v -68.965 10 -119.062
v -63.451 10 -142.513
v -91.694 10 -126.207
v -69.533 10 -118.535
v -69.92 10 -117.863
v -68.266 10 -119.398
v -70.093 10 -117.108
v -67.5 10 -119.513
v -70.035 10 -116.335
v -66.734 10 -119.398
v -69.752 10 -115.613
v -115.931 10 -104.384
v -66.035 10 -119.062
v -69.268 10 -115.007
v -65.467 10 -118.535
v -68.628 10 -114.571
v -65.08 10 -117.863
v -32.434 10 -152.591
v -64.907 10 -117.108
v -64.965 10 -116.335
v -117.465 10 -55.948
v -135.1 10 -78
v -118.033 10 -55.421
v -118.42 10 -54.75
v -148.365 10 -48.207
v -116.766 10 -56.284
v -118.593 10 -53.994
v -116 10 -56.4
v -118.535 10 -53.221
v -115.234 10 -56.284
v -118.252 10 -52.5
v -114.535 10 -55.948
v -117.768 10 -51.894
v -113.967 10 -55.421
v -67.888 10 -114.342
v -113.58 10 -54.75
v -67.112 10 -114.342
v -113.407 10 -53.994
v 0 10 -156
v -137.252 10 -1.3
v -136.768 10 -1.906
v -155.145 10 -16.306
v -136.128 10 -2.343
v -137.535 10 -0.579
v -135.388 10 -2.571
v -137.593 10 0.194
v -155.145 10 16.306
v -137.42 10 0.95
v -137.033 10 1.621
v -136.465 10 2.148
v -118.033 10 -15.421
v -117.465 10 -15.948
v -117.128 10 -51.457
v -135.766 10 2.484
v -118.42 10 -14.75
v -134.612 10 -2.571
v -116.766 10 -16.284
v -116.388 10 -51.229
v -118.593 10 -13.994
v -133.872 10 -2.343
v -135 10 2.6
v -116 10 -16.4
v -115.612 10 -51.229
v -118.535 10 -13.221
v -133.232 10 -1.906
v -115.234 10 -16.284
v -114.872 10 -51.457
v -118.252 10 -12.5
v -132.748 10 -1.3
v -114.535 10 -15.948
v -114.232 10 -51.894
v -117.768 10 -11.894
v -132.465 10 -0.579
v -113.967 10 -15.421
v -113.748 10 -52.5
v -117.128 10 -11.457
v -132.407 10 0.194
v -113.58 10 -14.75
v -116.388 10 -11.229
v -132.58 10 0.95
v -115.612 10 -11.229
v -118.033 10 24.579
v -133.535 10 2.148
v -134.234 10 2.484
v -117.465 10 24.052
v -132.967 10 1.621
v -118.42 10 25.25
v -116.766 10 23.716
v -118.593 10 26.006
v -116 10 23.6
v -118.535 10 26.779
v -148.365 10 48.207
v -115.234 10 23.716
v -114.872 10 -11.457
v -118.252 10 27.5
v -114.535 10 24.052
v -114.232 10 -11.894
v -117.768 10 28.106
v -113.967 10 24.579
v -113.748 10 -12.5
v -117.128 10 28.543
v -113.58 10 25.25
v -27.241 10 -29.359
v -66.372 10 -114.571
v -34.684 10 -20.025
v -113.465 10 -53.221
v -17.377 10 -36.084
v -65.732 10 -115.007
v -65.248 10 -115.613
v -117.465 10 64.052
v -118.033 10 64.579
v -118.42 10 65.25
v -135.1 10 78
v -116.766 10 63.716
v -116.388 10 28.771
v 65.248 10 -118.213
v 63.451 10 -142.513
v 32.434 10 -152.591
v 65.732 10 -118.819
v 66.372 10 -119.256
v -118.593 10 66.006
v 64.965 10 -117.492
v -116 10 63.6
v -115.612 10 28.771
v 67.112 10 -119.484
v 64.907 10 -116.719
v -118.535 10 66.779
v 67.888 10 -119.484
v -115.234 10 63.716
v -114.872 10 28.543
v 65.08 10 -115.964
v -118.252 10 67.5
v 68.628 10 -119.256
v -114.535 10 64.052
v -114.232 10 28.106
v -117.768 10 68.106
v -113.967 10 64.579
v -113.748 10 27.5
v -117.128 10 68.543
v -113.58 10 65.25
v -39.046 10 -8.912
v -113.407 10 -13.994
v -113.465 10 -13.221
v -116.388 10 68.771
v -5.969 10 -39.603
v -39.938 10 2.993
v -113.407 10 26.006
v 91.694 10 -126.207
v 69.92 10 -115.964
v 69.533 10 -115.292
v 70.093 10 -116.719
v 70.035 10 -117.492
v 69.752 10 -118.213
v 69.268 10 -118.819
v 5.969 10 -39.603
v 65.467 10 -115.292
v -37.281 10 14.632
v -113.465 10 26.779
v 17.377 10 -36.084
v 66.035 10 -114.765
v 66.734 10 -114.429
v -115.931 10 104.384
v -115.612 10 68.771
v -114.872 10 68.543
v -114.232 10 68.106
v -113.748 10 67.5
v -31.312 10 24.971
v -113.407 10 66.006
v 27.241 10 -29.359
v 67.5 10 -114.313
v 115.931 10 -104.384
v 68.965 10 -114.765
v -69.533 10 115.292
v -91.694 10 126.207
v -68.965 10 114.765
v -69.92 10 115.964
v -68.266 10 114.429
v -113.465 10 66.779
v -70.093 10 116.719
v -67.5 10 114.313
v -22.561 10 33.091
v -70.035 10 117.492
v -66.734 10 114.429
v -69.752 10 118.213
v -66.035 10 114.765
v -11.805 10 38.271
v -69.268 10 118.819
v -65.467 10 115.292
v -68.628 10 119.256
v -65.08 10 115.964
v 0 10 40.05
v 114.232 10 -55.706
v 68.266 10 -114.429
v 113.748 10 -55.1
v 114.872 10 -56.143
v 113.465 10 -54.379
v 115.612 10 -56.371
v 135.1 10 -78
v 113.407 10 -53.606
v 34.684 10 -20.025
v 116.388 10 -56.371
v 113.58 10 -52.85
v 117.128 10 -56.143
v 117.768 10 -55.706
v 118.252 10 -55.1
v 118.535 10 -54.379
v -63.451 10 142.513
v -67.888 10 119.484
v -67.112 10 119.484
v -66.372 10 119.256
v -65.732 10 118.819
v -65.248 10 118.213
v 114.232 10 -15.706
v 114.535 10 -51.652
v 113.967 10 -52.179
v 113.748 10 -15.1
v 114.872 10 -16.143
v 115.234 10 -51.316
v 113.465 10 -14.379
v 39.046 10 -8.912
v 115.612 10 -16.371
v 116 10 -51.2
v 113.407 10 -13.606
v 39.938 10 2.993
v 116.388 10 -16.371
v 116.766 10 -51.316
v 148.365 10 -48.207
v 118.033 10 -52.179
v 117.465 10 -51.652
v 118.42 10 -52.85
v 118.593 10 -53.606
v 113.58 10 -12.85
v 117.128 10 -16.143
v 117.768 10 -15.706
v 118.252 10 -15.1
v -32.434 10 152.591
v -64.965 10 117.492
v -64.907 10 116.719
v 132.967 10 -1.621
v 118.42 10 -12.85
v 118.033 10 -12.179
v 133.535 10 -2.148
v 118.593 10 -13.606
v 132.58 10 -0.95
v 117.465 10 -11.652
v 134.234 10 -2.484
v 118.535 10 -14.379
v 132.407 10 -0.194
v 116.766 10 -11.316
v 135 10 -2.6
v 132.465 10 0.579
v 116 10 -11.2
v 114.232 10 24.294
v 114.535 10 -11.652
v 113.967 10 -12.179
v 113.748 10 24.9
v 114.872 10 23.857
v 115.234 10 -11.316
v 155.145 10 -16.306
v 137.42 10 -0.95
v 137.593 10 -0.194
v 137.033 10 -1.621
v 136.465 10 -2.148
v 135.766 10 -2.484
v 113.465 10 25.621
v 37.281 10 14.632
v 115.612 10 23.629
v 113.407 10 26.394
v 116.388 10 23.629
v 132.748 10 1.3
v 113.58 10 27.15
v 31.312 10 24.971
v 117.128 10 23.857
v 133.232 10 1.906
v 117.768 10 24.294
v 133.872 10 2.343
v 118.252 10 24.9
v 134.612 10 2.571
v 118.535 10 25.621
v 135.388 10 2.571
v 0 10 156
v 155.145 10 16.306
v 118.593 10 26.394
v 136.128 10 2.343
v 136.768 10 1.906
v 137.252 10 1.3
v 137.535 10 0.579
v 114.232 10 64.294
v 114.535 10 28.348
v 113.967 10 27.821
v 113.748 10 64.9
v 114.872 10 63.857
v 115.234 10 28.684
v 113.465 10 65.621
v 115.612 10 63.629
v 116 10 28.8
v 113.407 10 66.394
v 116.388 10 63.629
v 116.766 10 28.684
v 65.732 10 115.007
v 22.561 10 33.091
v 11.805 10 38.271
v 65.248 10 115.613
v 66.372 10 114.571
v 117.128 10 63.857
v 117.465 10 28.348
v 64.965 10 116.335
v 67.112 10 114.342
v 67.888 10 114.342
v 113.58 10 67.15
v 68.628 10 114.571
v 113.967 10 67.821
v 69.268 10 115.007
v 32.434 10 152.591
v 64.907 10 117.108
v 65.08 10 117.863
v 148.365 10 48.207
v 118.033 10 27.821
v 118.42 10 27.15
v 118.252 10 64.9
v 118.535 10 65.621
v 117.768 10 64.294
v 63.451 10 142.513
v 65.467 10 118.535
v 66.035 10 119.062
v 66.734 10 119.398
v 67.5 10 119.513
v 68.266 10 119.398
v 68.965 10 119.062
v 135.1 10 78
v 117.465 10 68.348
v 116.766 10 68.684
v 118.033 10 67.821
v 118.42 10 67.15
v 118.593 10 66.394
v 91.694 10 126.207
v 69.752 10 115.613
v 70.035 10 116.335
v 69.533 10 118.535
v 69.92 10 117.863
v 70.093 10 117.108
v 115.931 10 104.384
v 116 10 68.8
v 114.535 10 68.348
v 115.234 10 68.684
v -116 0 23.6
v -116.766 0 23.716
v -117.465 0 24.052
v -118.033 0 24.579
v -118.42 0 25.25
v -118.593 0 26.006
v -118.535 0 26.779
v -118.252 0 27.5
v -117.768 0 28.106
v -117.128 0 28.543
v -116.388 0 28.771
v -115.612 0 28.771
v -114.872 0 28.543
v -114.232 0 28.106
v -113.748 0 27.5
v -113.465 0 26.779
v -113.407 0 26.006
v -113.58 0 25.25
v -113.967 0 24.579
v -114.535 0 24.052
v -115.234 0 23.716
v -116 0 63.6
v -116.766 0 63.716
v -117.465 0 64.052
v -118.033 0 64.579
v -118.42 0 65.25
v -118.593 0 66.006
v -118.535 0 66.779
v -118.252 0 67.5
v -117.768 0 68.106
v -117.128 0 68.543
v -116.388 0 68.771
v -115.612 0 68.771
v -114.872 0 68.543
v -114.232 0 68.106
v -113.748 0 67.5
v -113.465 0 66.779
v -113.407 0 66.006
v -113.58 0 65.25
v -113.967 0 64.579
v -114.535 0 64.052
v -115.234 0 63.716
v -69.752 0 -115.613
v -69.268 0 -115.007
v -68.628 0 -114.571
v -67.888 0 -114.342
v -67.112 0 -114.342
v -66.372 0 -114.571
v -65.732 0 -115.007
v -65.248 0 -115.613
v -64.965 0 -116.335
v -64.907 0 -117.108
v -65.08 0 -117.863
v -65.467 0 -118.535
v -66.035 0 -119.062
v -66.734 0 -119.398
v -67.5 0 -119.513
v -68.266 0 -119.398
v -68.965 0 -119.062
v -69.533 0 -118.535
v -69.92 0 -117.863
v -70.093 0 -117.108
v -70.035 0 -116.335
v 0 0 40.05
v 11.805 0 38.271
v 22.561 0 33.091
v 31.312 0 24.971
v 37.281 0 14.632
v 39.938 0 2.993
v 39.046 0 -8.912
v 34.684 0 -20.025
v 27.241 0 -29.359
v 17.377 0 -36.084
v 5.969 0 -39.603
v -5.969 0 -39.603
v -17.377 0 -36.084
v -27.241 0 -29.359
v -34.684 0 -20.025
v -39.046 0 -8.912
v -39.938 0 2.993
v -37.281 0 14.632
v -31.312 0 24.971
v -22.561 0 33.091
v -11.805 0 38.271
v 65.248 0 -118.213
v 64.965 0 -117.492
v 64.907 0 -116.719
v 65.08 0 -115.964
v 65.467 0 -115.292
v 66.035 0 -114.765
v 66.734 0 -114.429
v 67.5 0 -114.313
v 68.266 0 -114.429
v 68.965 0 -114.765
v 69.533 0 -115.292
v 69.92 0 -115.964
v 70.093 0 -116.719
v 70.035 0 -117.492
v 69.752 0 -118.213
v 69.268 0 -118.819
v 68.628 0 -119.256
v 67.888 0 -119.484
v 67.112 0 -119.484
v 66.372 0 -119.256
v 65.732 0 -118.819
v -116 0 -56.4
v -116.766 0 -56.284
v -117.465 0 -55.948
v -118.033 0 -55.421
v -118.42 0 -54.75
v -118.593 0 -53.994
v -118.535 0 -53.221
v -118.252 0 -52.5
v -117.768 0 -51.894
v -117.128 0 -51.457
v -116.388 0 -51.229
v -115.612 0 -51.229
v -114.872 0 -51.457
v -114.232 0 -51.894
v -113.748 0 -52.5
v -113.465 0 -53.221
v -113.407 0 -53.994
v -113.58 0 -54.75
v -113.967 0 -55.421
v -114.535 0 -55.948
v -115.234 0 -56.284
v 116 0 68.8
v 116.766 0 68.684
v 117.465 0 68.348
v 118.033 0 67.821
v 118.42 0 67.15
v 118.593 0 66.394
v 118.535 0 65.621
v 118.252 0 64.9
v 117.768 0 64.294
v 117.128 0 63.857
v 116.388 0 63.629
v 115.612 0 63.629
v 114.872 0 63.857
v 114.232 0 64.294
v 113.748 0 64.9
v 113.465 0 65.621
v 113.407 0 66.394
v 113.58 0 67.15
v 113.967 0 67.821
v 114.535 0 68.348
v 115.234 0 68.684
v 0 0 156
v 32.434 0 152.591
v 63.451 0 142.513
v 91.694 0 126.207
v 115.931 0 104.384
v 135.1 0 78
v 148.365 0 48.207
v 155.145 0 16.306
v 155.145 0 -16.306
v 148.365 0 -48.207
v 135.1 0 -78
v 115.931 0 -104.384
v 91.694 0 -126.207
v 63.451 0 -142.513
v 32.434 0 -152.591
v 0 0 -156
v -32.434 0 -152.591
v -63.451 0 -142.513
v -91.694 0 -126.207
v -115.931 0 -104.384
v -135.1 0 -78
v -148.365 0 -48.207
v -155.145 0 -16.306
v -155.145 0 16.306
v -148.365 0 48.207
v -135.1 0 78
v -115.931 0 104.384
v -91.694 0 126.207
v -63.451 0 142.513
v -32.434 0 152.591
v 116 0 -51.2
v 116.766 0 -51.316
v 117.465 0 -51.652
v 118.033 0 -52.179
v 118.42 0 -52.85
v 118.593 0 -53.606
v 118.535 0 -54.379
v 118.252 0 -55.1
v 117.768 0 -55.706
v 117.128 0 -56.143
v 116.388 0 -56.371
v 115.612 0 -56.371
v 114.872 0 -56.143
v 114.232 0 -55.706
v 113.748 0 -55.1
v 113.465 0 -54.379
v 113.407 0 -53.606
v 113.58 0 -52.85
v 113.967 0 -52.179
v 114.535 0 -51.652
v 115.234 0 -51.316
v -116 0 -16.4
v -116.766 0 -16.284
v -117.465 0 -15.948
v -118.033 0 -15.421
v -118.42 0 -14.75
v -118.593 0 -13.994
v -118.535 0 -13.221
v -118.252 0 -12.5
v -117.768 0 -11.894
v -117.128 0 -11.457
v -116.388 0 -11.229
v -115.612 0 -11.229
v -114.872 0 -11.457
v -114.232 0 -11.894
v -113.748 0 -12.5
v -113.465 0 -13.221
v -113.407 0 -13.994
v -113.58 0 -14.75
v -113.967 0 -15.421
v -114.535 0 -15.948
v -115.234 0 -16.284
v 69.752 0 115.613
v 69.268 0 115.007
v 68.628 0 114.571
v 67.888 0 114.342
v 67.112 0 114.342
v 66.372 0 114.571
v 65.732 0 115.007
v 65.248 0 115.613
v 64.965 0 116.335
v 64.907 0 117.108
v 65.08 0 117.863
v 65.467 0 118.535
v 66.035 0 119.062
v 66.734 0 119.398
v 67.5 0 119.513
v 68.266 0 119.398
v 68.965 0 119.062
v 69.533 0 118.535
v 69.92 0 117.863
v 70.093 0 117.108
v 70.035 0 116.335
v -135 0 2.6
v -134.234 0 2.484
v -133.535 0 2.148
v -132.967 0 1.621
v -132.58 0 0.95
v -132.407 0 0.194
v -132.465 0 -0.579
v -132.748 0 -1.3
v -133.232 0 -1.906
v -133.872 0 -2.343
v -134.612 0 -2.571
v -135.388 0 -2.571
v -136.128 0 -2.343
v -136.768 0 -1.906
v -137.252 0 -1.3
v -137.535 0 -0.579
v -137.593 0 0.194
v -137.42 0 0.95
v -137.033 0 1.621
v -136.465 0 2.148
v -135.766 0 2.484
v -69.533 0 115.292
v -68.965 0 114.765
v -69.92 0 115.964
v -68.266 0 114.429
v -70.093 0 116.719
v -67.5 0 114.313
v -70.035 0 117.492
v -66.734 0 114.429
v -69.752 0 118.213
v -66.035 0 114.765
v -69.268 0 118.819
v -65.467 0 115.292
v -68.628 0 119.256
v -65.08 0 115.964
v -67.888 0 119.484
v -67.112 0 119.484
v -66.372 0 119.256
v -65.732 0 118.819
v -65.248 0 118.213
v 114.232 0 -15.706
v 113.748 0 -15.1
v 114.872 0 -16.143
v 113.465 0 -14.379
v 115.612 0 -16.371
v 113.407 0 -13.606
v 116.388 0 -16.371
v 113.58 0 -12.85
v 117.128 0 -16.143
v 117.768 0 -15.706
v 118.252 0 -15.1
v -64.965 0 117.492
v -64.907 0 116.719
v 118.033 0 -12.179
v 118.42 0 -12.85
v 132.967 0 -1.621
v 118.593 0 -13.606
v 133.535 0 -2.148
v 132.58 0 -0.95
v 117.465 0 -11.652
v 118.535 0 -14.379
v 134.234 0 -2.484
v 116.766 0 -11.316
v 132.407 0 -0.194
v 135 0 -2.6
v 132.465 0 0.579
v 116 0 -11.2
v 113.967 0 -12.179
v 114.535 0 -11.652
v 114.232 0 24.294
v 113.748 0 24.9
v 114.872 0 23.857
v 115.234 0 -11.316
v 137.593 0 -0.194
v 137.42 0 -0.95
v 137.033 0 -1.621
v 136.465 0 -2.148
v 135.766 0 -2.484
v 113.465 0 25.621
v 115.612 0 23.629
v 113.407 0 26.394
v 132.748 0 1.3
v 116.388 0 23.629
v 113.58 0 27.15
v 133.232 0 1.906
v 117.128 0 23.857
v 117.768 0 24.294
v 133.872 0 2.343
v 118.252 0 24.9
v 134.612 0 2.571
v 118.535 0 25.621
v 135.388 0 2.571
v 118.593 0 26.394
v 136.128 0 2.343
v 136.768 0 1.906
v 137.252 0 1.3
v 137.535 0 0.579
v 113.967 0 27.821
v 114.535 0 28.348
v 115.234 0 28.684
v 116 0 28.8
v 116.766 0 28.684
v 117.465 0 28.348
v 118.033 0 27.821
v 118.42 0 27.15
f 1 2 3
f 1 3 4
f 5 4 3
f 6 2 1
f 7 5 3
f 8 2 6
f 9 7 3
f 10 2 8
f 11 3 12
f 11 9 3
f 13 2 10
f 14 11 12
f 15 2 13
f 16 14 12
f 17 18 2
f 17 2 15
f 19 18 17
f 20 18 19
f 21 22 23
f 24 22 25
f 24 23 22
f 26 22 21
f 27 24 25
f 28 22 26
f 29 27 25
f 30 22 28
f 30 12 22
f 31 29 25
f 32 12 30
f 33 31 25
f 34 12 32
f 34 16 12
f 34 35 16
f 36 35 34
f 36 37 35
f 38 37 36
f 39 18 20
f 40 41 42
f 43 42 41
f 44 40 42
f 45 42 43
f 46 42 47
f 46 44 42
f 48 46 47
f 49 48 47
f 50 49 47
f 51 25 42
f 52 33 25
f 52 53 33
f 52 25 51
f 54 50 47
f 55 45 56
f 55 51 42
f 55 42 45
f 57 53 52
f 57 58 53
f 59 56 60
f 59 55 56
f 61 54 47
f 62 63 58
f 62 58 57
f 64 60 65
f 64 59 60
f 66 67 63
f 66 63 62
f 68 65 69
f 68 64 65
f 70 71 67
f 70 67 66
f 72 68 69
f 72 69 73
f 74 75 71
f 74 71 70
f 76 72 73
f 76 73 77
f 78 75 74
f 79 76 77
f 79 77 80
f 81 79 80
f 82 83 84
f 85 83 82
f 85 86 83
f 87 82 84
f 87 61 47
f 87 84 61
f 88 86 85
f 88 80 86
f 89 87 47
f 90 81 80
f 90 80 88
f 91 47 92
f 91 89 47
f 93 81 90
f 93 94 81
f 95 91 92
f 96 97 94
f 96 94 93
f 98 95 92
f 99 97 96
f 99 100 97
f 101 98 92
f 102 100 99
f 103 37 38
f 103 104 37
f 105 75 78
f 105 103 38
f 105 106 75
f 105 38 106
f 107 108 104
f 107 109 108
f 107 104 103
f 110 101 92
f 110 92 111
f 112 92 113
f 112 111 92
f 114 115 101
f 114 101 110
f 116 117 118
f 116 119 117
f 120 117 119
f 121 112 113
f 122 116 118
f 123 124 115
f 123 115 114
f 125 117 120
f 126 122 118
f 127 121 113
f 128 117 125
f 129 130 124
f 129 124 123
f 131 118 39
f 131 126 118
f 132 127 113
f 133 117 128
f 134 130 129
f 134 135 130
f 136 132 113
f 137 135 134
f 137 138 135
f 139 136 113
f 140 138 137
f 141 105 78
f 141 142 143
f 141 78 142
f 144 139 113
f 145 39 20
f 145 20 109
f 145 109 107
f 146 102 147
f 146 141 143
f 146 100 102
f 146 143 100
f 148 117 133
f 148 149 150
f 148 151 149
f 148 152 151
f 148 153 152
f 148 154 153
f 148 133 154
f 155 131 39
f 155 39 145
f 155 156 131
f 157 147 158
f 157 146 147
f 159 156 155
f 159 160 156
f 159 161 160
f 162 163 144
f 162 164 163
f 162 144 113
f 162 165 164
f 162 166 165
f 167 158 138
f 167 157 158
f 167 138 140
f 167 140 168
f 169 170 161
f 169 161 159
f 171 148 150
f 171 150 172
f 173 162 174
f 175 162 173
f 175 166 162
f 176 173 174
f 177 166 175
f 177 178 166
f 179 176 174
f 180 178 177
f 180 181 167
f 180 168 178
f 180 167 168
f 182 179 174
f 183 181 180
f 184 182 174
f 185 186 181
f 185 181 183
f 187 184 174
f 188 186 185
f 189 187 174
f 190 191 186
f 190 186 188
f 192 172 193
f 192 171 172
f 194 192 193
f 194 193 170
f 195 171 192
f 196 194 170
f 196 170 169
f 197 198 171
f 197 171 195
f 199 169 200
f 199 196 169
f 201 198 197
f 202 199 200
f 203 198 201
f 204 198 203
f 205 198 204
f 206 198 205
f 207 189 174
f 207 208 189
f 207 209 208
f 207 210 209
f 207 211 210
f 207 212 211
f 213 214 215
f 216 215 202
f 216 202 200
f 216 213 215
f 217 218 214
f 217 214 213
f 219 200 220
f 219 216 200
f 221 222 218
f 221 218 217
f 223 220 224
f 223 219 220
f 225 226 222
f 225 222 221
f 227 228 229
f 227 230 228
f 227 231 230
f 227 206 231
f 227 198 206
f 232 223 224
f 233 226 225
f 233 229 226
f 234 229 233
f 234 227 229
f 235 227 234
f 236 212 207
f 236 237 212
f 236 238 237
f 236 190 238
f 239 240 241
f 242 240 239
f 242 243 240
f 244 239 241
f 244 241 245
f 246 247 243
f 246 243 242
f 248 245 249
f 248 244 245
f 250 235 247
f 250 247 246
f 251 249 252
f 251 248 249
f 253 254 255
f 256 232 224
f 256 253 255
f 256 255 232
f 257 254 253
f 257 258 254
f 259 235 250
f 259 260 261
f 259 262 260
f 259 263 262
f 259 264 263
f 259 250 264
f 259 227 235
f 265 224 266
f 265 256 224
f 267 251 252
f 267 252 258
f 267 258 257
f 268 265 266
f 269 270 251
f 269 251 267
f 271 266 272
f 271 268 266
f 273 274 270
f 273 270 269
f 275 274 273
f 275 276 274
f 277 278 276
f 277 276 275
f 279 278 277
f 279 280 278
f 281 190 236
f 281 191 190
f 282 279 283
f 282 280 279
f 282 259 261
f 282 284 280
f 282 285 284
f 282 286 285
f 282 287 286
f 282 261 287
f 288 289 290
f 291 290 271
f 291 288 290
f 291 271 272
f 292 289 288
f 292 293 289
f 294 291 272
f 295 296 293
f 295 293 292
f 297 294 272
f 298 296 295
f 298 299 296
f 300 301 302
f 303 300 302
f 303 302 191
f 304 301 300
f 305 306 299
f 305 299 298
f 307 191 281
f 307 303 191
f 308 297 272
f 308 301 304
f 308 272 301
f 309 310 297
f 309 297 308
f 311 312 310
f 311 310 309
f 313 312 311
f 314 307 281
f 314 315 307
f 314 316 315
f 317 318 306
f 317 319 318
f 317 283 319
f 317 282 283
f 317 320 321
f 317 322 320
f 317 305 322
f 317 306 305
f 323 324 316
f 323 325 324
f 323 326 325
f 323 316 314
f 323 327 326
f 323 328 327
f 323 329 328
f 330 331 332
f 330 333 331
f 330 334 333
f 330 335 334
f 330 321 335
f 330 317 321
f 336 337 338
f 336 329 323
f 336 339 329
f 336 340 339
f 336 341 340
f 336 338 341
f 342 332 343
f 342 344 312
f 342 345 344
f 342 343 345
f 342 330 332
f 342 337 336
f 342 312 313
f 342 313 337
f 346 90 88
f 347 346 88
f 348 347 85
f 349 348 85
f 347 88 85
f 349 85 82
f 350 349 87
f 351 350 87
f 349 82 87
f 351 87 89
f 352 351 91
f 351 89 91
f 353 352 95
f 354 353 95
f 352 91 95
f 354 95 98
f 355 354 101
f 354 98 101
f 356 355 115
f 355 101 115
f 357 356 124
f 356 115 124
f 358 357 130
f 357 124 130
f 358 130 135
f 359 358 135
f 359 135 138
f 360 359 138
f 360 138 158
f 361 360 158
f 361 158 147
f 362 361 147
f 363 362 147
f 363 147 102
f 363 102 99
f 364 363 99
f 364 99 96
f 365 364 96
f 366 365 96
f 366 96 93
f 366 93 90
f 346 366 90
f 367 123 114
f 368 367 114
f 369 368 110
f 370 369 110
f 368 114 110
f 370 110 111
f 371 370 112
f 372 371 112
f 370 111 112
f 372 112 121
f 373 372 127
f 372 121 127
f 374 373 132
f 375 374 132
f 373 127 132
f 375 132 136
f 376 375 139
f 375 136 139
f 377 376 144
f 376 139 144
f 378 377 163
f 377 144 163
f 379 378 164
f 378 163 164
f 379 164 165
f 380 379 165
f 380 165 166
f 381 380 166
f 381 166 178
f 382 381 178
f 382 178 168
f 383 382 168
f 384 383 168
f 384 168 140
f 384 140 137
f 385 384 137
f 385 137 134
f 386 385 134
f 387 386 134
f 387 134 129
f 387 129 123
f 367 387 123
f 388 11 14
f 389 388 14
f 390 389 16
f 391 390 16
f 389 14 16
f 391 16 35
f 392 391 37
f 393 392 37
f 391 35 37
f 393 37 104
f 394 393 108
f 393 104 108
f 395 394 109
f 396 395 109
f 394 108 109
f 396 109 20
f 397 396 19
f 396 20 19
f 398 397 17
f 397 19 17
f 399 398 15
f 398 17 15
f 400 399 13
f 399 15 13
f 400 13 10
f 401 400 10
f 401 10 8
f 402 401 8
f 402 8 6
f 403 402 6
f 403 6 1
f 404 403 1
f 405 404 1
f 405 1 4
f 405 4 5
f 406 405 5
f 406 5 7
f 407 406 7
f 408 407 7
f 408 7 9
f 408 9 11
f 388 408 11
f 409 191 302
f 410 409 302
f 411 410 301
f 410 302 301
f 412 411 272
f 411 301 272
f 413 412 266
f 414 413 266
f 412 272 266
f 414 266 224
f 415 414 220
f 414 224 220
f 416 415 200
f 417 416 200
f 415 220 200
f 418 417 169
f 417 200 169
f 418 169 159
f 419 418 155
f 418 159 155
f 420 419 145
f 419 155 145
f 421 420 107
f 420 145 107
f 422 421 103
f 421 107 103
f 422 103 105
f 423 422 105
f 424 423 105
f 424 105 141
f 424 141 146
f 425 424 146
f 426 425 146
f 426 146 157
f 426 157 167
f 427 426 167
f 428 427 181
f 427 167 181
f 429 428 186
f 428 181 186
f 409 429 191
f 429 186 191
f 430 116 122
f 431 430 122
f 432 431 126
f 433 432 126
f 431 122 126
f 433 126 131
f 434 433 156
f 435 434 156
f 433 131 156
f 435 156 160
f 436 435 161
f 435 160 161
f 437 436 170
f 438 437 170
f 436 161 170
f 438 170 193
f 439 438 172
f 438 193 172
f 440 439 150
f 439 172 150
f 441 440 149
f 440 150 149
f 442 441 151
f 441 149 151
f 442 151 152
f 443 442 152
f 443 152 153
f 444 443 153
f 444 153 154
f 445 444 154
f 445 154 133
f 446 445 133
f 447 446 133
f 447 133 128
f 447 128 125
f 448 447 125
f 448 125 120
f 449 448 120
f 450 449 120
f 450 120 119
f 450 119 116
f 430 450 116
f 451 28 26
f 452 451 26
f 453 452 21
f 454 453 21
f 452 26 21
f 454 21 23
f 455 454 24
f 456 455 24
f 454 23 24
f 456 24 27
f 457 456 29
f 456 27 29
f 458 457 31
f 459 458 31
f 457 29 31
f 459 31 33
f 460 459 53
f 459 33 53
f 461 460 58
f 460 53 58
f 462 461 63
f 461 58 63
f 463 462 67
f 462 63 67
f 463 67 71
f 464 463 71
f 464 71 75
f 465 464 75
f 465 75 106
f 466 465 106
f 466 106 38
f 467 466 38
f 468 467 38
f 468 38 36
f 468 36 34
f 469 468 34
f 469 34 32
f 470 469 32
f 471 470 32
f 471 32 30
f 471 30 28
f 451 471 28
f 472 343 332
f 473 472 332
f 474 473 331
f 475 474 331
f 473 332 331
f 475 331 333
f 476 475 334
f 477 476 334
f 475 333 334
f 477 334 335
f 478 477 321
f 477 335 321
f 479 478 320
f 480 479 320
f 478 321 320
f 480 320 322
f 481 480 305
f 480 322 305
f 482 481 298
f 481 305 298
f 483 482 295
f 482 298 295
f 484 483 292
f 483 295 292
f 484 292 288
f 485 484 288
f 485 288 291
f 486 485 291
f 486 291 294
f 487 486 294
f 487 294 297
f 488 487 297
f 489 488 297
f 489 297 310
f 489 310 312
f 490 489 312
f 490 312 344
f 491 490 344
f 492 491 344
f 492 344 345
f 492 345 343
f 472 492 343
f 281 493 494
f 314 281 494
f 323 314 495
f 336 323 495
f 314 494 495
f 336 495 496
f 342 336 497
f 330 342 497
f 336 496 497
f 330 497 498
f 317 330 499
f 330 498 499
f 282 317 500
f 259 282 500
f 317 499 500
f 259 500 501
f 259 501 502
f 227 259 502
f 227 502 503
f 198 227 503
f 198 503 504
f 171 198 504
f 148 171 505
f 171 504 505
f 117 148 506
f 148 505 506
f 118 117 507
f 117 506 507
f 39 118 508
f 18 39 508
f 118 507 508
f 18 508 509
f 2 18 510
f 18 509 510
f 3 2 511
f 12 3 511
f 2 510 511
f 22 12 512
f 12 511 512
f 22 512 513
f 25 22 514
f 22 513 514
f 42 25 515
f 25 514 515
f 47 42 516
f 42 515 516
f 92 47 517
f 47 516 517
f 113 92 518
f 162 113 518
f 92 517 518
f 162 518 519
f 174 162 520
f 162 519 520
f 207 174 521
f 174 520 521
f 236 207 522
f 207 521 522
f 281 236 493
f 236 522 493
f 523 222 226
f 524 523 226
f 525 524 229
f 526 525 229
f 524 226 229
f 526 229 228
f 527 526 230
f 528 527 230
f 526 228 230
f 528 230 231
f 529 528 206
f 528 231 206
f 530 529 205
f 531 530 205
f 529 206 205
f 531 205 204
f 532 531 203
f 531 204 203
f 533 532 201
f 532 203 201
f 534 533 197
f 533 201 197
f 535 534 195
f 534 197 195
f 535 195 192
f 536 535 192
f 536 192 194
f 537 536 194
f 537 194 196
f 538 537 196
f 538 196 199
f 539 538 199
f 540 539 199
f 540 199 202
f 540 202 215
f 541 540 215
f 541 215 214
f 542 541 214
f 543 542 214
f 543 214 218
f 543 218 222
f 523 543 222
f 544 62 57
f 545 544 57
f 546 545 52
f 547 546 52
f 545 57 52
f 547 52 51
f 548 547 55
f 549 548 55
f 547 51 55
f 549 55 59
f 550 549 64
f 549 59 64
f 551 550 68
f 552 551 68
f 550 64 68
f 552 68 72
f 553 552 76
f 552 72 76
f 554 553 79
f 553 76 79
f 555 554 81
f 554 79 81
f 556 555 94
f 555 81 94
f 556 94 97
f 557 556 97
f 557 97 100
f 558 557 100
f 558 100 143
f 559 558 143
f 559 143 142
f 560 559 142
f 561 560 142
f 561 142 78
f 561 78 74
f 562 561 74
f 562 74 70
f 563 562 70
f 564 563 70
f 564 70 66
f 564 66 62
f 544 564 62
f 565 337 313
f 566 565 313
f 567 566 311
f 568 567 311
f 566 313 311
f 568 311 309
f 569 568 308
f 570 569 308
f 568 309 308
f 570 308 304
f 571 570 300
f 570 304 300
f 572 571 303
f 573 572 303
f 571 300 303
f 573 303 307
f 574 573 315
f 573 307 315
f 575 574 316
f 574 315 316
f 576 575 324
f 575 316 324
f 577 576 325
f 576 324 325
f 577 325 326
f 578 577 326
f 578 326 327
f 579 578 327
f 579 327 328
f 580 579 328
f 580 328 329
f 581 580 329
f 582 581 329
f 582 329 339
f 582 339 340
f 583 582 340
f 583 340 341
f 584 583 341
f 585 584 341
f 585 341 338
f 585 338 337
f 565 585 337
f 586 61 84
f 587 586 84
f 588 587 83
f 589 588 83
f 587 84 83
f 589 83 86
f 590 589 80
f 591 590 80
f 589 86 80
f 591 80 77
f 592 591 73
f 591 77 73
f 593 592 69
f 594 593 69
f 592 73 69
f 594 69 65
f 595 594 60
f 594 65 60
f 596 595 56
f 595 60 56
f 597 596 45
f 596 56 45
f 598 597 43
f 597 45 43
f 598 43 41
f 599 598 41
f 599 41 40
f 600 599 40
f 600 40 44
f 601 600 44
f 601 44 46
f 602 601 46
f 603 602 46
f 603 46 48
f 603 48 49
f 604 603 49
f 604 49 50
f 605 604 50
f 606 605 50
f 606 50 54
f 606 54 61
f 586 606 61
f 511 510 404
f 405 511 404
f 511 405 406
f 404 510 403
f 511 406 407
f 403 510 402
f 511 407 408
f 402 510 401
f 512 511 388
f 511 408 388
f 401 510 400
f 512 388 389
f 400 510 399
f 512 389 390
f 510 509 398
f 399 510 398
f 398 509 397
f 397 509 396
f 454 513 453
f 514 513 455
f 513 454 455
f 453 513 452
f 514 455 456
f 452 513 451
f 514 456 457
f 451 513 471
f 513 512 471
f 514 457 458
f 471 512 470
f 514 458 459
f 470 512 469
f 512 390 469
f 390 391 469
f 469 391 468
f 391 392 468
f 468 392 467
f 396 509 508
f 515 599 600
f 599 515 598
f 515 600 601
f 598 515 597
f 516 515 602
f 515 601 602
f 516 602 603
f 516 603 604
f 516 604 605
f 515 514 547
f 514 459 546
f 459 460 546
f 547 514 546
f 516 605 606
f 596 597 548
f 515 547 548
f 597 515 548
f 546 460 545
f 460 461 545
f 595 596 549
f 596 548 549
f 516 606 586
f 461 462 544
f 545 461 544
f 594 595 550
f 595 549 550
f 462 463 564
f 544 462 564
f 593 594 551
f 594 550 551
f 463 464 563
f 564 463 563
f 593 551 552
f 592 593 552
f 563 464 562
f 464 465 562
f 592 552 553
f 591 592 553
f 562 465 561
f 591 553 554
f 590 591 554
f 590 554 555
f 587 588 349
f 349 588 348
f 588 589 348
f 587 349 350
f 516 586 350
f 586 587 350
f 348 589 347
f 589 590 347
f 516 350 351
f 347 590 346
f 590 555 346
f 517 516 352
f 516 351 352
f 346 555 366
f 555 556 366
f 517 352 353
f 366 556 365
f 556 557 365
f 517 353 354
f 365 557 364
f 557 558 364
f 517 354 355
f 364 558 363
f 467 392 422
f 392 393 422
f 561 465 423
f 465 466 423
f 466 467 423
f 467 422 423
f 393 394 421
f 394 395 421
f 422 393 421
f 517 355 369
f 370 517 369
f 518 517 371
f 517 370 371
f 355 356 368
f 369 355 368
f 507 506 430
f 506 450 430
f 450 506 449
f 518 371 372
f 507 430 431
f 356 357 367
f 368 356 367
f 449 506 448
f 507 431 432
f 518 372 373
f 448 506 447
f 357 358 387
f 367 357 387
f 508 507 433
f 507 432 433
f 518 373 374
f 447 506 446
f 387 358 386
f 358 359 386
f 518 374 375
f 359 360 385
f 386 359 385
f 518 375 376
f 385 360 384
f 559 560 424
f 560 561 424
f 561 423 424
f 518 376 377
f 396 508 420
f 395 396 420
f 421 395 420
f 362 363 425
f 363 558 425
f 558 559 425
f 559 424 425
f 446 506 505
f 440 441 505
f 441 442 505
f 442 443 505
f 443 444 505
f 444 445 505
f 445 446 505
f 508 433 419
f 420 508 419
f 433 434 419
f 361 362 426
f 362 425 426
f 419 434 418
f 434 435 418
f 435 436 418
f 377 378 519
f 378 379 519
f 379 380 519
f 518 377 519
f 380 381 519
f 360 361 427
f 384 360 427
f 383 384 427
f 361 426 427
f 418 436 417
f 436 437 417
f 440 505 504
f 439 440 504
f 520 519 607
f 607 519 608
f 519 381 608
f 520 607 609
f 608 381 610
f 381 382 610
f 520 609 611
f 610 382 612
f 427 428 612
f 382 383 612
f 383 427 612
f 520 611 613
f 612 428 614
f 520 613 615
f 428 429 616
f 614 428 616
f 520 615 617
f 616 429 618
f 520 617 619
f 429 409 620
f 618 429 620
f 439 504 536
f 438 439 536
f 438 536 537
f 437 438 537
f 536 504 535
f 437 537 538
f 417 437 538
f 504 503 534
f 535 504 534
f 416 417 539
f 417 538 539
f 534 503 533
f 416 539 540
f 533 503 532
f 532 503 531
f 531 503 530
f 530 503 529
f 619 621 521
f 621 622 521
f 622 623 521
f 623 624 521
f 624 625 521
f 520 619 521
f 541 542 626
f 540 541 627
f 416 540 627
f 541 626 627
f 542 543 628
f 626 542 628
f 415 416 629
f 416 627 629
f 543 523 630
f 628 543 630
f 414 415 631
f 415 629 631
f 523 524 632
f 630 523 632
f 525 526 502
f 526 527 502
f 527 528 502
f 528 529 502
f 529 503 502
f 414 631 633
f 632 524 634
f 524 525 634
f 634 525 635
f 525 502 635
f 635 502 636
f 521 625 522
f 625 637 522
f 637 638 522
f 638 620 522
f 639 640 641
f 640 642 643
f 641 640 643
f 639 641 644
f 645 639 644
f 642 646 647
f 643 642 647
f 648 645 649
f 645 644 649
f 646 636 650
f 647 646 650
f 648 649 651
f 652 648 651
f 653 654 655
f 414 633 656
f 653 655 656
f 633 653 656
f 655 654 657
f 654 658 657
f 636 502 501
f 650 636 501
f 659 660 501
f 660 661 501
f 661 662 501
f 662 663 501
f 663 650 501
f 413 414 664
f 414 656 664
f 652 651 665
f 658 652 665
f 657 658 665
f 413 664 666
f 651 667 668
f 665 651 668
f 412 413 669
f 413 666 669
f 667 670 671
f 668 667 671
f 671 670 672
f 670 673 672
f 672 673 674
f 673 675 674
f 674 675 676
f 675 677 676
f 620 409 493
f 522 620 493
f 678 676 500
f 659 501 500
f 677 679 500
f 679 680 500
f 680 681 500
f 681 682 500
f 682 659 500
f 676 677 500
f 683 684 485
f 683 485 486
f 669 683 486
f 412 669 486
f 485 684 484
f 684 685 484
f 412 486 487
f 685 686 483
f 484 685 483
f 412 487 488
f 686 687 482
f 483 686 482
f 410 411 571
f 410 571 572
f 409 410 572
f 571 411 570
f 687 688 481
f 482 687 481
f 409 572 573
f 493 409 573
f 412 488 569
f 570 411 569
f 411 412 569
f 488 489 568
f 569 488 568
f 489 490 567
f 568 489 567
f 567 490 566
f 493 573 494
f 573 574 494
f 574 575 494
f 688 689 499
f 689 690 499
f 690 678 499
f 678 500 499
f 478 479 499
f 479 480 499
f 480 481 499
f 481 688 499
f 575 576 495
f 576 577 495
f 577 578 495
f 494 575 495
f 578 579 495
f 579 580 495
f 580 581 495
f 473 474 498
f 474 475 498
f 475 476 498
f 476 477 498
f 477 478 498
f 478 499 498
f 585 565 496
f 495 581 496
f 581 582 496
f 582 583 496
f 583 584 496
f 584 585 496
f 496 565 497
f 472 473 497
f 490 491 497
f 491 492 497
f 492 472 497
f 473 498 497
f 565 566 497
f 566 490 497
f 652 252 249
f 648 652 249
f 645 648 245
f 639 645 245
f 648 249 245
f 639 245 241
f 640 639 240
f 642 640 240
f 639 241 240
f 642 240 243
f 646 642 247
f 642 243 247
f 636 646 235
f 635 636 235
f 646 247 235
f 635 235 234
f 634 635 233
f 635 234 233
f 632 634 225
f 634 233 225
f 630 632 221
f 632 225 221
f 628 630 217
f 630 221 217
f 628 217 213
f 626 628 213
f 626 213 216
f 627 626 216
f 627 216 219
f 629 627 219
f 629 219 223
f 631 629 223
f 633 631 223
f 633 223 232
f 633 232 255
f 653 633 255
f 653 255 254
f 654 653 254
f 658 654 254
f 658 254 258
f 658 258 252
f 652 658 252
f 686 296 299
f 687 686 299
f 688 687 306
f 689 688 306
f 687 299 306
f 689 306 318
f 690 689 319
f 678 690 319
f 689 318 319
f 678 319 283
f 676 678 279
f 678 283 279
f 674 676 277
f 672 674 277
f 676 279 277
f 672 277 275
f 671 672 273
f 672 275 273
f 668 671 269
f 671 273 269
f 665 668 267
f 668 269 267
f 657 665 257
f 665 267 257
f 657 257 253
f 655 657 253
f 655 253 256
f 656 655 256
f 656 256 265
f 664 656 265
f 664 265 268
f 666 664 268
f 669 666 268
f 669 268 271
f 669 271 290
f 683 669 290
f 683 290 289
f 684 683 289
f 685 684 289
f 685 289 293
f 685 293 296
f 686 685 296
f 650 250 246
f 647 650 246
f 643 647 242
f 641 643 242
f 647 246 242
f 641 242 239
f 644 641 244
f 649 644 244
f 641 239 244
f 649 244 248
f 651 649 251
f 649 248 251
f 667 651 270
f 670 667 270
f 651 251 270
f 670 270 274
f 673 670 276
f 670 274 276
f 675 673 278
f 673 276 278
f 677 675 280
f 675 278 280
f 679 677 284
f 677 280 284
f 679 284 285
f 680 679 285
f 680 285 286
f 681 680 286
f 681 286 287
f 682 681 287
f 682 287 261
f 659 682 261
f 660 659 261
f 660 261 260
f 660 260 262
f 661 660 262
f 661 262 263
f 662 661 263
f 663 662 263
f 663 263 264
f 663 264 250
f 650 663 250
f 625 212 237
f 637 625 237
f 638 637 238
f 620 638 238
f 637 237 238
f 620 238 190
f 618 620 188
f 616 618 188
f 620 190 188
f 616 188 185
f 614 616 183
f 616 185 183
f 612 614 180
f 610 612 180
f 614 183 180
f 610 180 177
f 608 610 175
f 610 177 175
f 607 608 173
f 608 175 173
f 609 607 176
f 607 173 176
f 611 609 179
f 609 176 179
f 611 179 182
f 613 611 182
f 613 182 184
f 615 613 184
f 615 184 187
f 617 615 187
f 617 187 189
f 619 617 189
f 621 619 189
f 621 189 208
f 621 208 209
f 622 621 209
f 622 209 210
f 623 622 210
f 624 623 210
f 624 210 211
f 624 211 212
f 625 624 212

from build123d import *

# Parameters (mm, degrees)
SKETCH_1_R               = 156
EXTRUDE_1_DEPTH          = 10
SKETCH_2_R               = 2.6
CUT_EXTRUDE_1_DEPTH      = 221.843836228
SKETCH_3_R               = 40.05
CUT_EXTRUDE_2_DEPTH      = 10
SKETCH_4_R               = 2.6
CUT_EXTRUDE_4_DEPTH      = 221.843836228
PATTERN_CIRCULAR_1_COUNT = 6


with BuildPart() as part:
    # Эскиз1 → Бобышка-Вытянуть1 (new body)
    with BuildSketch(Plane(origin=(0, 0, 0), x_dir=(1, 0, 0), z_dir=(0, 1, 0))):
        with Locations(Location((0, 0, 0), (0, 0, 270))):
            Circle(SKETCH_1_R)
    extrude(amount=EXTRUDE_1_DEPTH)

    # Эскиз2 → Вырез-Вытянуть1 (cut, through all)
    with BuildSketch(Plane(origin=(0, 10, 0), x_dir=(1, 0, 0), z_dir=(0, 1, 0))):
        with Locations(Location((116, 13.8, 0), (0, 0, 270))):
            Circle(SKETCH_2_R)
        with Locations(Location((116, 53.8, 0), (0, 0, 270))):
            Circle(SKETCH_2_R)
        with Locations(Location((116, -26.2, 0), (0, 0, 270))):
            Circle(SKETCH_2_R)
        with Locations(Location((116, -66.2, 0), (0, 0, 270))):
            Circle(SKETCH_2_R)
        with Locations(Location((-116, -66.2, 0), (0, 0, 90))):
            Circle(SKETCH_2_R)
        with Locations(Location((-116, -26.2, 0), (0, 0, 90))):
            Circle(SKETCH_2_R)
        with Locations(Location((-116, 13.8, 0), (0, 0, 90))):
            Circle(SKETCH_2_R)
        with Locations(Location((-116, 53.8, 0), (0, 0, 90))):
            Circle(SKETCH_2_R)
    extrude(amount=-CUT_EXTRUDE_1_DEPTH, mode=Mode.SUBTRACT)

    # Эскиз3 → Вырез-Вытянуть2 (cut)
    with BuildSketch(Plane(origin=(0, 10, 0), x_dir=(1, 0, 0), z_dir=(0, 1, 0))):
        with Locations(Location((0, 0, 0), (0, 0, 270))):
            Circle(SKETCH_3_R)
    extrude(amount=-CUT_EXTRUDE_2_DEPTH, mode=Mode.SUBTRACT)

    # Эскиз4 → Вырез-Вытянуть4 (cut, through all)
    with BuildSketch(Plane(origin=(0, 10, 0), x_dir=(1, 0, 0), z_dir=(0, 1, 0))):
        with Locations(Location((-135, 0, 0), (0, 0, 270))):
            Circle(SKETCH_4_R)
    cut_extrude_4 = extrude(amount=-CUT_EXTRUDE_4_DEPTH, mode=Mode.SUBTRACT)

    # Круговой массив1: Вырез-Вытянуть4 ×6 about axis
    pattern_circular_1_axis = Axis((0, 0, 0), (0, 1, 0))
    for i in range(1, PATTERN_CIRCULAR_1_COUNT):
        add(cut_extrude_4.rotate(pattern_circular_1_axis, i * 360 / PATTERN_CIRCULAR_1_COUNT), mode=Mode.SUBTRACT)


solid = part.part
